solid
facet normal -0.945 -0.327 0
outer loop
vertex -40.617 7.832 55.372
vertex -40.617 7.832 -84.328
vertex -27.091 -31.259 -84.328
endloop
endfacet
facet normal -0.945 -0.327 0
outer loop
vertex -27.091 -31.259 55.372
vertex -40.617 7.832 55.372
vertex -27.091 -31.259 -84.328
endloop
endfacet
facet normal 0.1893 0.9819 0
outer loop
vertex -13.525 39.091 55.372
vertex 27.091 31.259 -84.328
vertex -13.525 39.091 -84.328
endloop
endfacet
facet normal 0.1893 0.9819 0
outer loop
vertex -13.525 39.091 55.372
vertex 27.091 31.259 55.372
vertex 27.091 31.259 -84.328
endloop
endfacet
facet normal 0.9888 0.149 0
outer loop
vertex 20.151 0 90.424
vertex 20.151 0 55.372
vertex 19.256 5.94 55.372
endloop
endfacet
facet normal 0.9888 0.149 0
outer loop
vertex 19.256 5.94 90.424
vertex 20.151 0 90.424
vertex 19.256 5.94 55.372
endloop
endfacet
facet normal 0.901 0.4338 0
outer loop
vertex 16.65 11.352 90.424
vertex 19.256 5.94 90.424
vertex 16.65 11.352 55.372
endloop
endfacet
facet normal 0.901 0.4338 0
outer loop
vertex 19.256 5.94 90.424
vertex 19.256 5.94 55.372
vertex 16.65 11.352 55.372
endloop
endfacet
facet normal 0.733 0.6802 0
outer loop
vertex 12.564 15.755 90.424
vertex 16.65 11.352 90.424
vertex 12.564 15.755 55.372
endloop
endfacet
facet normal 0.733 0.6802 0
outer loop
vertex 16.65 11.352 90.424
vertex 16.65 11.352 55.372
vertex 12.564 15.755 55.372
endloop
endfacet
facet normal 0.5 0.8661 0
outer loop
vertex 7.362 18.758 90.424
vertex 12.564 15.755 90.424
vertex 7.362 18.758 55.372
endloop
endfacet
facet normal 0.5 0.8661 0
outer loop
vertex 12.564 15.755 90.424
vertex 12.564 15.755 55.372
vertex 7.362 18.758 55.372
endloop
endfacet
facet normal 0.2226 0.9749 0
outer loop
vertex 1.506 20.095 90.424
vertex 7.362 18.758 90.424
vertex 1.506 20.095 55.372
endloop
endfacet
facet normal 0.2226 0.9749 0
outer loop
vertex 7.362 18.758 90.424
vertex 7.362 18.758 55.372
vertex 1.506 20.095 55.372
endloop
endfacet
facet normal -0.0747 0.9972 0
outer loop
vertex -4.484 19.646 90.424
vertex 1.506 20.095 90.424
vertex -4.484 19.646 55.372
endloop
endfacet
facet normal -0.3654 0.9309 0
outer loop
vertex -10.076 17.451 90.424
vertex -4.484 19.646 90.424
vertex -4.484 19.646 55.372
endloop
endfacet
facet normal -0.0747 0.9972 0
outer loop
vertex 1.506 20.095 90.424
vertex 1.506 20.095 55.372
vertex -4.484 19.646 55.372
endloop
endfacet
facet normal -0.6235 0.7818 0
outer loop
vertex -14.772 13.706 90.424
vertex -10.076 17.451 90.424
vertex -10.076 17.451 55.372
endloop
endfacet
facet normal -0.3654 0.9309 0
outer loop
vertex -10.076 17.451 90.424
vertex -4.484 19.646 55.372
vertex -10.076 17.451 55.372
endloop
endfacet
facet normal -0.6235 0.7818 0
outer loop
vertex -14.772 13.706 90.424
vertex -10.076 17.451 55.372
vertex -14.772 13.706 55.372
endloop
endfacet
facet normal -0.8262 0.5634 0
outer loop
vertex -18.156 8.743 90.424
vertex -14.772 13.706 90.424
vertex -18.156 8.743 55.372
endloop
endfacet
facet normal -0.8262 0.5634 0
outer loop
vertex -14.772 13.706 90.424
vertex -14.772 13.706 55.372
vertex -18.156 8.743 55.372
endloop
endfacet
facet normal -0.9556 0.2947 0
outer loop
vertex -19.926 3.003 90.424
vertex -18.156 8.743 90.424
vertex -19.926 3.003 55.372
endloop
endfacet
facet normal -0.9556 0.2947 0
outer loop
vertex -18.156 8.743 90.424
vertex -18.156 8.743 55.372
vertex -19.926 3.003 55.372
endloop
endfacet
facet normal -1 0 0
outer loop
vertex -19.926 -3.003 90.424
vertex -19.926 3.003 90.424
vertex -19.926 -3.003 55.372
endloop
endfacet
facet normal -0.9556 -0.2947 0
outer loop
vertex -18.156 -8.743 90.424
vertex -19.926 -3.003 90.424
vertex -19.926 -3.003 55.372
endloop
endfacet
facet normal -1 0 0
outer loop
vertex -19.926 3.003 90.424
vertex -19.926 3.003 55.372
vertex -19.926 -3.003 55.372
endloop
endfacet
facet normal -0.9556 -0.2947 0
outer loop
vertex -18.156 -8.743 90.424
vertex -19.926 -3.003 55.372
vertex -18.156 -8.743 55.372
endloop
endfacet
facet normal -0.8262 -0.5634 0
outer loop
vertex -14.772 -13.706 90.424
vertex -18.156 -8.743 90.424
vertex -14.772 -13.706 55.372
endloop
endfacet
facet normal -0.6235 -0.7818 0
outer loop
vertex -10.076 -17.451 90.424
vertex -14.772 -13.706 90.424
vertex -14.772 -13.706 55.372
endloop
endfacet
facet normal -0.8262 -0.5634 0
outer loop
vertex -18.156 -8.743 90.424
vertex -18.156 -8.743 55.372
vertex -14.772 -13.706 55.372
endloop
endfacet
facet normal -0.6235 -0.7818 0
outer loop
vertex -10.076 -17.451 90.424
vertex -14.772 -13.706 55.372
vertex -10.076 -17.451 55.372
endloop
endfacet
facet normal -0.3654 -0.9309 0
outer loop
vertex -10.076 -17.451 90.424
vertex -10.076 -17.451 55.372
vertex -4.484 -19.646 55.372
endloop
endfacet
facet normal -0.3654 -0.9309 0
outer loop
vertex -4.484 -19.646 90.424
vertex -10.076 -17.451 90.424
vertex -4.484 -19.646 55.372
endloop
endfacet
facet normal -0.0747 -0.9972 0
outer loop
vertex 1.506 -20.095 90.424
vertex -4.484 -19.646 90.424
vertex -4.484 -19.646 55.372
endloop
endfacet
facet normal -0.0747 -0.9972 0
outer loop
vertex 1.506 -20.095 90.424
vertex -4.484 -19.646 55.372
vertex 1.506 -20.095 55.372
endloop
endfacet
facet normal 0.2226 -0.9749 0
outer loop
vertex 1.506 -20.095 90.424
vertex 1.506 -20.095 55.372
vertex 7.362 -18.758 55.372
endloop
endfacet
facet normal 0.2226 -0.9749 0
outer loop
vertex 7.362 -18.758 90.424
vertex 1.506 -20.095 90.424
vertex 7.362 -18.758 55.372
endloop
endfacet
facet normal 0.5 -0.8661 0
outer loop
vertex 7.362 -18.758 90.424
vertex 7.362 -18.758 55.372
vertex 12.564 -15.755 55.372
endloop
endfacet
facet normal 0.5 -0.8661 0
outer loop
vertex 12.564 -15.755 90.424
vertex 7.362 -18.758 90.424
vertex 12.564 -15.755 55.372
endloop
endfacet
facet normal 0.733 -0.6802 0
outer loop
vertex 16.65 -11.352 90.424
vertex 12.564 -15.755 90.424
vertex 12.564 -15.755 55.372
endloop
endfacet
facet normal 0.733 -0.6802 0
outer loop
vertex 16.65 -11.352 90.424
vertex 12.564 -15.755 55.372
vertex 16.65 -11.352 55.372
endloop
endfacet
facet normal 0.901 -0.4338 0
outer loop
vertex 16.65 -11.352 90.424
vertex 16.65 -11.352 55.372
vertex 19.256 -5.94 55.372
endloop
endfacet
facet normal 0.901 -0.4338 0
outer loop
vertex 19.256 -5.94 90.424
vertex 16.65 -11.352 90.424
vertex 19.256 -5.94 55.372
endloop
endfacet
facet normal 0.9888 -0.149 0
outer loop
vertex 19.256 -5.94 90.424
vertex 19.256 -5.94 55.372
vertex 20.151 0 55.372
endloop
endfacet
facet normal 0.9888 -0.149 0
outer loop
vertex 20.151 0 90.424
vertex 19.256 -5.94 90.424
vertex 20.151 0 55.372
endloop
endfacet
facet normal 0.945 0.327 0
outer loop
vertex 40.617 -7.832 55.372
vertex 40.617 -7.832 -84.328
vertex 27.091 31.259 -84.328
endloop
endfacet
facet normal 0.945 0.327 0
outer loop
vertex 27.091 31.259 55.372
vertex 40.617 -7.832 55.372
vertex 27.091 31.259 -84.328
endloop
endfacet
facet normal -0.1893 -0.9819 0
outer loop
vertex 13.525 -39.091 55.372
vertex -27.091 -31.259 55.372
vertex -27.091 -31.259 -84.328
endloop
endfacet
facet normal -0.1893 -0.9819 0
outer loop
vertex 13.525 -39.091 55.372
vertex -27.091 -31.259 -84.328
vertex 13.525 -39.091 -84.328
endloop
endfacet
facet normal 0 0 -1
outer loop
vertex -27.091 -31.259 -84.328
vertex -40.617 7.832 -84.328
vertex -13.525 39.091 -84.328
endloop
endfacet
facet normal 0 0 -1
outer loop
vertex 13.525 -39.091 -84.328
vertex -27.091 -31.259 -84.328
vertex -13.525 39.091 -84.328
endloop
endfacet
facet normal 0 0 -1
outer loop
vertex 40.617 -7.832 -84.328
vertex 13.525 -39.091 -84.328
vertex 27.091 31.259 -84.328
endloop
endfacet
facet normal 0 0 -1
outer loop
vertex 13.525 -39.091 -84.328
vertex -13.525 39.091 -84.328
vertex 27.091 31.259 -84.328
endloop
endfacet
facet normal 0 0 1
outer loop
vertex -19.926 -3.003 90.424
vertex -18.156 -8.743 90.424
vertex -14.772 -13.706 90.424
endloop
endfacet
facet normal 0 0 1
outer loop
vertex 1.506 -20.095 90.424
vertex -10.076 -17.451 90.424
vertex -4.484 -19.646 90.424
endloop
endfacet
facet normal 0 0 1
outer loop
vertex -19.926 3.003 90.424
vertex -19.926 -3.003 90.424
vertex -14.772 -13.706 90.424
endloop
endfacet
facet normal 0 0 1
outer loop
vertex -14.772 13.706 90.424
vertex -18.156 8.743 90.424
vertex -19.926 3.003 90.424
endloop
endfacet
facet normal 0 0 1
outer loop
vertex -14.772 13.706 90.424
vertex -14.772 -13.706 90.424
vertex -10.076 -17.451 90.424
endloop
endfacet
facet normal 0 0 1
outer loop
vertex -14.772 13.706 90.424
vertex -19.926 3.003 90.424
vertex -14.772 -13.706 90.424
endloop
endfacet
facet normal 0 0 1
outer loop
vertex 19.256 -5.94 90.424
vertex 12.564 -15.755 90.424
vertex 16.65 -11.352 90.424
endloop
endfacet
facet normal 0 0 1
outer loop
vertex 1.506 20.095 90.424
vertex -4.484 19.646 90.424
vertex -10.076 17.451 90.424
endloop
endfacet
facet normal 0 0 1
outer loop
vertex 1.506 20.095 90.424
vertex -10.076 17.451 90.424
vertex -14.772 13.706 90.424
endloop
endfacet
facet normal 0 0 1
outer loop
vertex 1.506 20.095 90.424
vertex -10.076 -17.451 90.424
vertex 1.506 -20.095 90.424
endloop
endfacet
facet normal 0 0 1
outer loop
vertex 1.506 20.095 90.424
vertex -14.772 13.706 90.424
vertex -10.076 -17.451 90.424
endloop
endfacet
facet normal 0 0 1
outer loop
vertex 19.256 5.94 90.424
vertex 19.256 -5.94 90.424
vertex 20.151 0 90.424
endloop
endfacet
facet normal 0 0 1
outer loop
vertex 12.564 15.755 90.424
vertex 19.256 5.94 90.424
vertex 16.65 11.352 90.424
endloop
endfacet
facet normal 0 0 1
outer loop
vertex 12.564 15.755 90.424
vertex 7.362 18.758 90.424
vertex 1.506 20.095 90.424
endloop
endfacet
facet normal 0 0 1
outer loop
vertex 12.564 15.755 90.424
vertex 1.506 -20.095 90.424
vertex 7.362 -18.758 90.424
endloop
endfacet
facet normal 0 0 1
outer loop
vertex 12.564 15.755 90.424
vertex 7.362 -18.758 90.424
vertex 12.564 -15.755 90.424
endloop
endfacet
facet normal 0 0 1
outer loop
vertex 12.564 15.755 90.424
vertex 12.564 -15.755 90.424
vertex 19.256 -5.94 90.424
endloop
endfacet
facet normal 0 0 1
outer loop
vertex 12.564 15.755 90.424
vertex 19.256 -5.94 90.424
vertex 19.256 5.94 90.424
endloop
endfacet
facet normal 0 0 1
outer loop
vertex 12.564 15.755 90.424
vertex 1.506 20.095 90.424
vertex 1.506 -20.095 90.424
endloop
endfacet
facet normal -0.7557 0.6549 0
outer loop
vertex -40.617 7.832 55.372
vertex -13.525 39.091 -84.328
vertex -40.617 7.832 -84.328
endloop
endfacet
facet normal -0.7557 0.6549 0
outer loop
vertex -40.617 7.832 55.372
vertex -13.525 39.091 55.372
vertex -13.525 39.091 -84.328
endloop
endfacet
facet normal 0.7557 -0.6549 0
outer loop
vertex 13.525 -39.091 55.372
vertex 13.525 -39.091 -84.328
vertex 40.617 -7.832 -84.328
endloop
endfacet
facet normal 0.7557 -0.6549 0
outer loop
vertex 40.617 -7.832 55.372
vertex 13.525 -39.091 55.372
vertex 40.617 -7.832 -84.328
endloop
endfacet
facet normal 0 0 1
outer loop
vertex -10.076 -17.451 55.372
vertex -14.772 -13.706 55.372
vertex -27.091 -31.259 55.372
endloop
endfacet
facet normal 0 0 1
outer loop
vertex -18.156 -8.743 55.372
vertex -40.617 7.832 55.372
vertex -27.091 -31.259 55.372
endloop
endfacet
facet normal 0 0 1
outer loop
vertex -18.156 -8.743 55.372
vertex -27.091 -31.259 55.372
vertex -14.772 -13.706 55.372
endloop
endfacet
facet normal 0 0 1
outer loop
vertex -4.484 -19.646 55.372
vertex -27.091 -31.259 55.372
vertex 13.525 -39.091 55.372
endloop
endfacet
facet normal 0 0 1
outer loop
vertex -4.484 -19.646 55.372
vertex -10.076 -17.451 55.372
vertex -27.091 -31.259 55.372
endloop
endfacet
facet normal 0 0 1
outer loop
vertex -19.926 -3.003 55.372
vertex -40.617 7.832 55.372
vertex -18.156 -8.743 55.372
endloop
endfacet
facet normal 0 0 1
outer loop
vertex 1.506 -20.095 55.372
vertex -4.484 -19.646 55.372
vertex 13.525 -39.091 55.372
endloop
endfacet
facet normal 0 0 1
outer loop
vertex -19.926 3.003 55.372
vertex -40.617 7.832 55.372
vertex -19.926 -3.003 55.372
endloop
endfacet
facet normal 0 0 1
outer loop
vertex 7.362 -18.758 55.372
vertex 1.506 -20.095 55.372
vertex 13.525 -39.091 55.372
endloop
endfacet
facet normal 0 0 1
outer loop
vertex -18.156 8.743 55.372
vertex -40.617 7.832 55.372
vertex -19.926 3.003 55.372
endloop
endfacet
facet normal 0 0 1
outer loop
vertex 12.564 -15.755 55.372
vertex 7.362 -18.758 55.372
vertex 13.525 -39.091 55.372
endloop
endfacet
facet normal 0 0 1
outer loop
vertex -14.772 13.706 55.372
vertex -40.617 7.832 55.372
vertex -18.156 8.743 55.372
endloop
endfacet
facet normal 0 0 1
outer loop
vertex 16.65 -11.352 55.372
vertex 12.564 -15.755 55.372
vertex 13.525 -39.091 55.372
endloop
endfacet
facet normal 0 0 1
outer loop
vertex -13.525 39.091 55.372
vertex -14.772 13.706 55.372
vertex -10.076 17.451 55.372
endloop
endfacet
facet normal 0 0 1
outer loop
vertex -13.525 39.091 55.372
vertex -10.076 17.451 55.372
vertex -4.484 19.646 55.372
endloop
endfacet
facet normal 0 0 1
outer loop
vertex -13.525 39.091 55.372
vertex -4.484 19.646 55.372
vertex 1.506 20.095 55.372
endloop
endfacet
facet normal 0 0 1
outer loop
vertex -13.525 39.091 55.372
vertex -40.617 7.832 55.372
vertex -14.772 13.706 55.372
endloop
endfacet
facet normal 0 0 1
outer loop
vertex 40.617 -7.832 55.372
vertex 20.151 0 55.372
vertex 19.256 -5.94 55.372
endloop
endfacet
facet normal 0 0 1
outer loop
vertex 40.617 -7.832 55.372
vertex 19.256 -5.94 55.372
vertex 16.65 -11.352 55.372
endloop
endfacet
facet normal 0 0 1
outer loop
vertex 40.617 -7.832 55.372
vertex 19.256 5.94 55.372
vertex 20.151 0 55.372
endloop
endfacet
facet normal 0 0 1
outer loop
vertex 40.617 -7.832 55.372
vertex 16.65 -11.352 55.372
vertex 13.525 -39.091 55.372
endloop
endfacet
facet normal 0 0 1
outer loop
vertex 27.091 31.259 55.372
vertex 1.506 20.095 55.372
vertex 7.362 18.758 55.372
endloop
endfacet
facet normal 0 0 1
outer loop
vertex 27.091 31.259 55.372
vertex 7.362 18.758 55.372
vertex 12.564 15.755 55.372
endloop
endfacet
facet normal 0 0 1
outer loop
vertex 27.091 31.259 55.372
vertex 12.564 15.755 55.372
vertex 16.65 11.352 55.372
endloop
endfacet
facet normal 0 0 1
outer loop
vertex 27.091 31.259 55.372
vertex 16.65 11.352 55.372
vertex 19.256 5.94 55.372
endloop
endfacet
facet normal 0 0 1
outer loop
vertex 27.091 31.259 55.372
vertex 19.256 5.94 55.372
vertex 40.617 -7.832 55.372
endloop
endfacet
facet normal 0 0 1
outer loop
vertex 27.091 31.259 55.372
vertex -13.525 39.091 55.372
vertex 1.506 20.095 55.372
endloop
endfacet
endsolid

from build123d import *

# Parameters (mm, degrees)
F0_R     = 26.8270894081
F1_DEPTH = 55.372
F2_R     = 20.1512437213
F3_DEPTH = 90.424
F4_DEPTH = 84.328


with BuildPart() as f1:
    # F0 (on Top) → F1 (new body)
    with BuildSketch(Plane.XY):
        Polygon((-13.5254997487, 39.0910579561), (-40.6165991252, 7.8321025968), (-27.0910993765, -31.2589553593), (13.5254997487, -39.0910579561), (40.6165991252, -7.8321025968), (27.0910993765, 31.2589553593), align=None)
        Circle(F0_R, mode=Mode.SUBTRACT)
        Circle(F0_R)
    extrude(amount=F1_DEPTH)

    # F2 (on Top) → F3 (join)
    with BuildSketch(Plane.XY):
        Circle(F2_R)
    extrude(amount=F3_DEPTH)

    # F4 (add): a face of the model
    f4_faces = [f1.faces().sort_by_distance(p)[0] for p in [
        (0, 0, 0),
    ]]
    extrude(f4_faces, amount=F4_DEPTH)


solid = f1.part
